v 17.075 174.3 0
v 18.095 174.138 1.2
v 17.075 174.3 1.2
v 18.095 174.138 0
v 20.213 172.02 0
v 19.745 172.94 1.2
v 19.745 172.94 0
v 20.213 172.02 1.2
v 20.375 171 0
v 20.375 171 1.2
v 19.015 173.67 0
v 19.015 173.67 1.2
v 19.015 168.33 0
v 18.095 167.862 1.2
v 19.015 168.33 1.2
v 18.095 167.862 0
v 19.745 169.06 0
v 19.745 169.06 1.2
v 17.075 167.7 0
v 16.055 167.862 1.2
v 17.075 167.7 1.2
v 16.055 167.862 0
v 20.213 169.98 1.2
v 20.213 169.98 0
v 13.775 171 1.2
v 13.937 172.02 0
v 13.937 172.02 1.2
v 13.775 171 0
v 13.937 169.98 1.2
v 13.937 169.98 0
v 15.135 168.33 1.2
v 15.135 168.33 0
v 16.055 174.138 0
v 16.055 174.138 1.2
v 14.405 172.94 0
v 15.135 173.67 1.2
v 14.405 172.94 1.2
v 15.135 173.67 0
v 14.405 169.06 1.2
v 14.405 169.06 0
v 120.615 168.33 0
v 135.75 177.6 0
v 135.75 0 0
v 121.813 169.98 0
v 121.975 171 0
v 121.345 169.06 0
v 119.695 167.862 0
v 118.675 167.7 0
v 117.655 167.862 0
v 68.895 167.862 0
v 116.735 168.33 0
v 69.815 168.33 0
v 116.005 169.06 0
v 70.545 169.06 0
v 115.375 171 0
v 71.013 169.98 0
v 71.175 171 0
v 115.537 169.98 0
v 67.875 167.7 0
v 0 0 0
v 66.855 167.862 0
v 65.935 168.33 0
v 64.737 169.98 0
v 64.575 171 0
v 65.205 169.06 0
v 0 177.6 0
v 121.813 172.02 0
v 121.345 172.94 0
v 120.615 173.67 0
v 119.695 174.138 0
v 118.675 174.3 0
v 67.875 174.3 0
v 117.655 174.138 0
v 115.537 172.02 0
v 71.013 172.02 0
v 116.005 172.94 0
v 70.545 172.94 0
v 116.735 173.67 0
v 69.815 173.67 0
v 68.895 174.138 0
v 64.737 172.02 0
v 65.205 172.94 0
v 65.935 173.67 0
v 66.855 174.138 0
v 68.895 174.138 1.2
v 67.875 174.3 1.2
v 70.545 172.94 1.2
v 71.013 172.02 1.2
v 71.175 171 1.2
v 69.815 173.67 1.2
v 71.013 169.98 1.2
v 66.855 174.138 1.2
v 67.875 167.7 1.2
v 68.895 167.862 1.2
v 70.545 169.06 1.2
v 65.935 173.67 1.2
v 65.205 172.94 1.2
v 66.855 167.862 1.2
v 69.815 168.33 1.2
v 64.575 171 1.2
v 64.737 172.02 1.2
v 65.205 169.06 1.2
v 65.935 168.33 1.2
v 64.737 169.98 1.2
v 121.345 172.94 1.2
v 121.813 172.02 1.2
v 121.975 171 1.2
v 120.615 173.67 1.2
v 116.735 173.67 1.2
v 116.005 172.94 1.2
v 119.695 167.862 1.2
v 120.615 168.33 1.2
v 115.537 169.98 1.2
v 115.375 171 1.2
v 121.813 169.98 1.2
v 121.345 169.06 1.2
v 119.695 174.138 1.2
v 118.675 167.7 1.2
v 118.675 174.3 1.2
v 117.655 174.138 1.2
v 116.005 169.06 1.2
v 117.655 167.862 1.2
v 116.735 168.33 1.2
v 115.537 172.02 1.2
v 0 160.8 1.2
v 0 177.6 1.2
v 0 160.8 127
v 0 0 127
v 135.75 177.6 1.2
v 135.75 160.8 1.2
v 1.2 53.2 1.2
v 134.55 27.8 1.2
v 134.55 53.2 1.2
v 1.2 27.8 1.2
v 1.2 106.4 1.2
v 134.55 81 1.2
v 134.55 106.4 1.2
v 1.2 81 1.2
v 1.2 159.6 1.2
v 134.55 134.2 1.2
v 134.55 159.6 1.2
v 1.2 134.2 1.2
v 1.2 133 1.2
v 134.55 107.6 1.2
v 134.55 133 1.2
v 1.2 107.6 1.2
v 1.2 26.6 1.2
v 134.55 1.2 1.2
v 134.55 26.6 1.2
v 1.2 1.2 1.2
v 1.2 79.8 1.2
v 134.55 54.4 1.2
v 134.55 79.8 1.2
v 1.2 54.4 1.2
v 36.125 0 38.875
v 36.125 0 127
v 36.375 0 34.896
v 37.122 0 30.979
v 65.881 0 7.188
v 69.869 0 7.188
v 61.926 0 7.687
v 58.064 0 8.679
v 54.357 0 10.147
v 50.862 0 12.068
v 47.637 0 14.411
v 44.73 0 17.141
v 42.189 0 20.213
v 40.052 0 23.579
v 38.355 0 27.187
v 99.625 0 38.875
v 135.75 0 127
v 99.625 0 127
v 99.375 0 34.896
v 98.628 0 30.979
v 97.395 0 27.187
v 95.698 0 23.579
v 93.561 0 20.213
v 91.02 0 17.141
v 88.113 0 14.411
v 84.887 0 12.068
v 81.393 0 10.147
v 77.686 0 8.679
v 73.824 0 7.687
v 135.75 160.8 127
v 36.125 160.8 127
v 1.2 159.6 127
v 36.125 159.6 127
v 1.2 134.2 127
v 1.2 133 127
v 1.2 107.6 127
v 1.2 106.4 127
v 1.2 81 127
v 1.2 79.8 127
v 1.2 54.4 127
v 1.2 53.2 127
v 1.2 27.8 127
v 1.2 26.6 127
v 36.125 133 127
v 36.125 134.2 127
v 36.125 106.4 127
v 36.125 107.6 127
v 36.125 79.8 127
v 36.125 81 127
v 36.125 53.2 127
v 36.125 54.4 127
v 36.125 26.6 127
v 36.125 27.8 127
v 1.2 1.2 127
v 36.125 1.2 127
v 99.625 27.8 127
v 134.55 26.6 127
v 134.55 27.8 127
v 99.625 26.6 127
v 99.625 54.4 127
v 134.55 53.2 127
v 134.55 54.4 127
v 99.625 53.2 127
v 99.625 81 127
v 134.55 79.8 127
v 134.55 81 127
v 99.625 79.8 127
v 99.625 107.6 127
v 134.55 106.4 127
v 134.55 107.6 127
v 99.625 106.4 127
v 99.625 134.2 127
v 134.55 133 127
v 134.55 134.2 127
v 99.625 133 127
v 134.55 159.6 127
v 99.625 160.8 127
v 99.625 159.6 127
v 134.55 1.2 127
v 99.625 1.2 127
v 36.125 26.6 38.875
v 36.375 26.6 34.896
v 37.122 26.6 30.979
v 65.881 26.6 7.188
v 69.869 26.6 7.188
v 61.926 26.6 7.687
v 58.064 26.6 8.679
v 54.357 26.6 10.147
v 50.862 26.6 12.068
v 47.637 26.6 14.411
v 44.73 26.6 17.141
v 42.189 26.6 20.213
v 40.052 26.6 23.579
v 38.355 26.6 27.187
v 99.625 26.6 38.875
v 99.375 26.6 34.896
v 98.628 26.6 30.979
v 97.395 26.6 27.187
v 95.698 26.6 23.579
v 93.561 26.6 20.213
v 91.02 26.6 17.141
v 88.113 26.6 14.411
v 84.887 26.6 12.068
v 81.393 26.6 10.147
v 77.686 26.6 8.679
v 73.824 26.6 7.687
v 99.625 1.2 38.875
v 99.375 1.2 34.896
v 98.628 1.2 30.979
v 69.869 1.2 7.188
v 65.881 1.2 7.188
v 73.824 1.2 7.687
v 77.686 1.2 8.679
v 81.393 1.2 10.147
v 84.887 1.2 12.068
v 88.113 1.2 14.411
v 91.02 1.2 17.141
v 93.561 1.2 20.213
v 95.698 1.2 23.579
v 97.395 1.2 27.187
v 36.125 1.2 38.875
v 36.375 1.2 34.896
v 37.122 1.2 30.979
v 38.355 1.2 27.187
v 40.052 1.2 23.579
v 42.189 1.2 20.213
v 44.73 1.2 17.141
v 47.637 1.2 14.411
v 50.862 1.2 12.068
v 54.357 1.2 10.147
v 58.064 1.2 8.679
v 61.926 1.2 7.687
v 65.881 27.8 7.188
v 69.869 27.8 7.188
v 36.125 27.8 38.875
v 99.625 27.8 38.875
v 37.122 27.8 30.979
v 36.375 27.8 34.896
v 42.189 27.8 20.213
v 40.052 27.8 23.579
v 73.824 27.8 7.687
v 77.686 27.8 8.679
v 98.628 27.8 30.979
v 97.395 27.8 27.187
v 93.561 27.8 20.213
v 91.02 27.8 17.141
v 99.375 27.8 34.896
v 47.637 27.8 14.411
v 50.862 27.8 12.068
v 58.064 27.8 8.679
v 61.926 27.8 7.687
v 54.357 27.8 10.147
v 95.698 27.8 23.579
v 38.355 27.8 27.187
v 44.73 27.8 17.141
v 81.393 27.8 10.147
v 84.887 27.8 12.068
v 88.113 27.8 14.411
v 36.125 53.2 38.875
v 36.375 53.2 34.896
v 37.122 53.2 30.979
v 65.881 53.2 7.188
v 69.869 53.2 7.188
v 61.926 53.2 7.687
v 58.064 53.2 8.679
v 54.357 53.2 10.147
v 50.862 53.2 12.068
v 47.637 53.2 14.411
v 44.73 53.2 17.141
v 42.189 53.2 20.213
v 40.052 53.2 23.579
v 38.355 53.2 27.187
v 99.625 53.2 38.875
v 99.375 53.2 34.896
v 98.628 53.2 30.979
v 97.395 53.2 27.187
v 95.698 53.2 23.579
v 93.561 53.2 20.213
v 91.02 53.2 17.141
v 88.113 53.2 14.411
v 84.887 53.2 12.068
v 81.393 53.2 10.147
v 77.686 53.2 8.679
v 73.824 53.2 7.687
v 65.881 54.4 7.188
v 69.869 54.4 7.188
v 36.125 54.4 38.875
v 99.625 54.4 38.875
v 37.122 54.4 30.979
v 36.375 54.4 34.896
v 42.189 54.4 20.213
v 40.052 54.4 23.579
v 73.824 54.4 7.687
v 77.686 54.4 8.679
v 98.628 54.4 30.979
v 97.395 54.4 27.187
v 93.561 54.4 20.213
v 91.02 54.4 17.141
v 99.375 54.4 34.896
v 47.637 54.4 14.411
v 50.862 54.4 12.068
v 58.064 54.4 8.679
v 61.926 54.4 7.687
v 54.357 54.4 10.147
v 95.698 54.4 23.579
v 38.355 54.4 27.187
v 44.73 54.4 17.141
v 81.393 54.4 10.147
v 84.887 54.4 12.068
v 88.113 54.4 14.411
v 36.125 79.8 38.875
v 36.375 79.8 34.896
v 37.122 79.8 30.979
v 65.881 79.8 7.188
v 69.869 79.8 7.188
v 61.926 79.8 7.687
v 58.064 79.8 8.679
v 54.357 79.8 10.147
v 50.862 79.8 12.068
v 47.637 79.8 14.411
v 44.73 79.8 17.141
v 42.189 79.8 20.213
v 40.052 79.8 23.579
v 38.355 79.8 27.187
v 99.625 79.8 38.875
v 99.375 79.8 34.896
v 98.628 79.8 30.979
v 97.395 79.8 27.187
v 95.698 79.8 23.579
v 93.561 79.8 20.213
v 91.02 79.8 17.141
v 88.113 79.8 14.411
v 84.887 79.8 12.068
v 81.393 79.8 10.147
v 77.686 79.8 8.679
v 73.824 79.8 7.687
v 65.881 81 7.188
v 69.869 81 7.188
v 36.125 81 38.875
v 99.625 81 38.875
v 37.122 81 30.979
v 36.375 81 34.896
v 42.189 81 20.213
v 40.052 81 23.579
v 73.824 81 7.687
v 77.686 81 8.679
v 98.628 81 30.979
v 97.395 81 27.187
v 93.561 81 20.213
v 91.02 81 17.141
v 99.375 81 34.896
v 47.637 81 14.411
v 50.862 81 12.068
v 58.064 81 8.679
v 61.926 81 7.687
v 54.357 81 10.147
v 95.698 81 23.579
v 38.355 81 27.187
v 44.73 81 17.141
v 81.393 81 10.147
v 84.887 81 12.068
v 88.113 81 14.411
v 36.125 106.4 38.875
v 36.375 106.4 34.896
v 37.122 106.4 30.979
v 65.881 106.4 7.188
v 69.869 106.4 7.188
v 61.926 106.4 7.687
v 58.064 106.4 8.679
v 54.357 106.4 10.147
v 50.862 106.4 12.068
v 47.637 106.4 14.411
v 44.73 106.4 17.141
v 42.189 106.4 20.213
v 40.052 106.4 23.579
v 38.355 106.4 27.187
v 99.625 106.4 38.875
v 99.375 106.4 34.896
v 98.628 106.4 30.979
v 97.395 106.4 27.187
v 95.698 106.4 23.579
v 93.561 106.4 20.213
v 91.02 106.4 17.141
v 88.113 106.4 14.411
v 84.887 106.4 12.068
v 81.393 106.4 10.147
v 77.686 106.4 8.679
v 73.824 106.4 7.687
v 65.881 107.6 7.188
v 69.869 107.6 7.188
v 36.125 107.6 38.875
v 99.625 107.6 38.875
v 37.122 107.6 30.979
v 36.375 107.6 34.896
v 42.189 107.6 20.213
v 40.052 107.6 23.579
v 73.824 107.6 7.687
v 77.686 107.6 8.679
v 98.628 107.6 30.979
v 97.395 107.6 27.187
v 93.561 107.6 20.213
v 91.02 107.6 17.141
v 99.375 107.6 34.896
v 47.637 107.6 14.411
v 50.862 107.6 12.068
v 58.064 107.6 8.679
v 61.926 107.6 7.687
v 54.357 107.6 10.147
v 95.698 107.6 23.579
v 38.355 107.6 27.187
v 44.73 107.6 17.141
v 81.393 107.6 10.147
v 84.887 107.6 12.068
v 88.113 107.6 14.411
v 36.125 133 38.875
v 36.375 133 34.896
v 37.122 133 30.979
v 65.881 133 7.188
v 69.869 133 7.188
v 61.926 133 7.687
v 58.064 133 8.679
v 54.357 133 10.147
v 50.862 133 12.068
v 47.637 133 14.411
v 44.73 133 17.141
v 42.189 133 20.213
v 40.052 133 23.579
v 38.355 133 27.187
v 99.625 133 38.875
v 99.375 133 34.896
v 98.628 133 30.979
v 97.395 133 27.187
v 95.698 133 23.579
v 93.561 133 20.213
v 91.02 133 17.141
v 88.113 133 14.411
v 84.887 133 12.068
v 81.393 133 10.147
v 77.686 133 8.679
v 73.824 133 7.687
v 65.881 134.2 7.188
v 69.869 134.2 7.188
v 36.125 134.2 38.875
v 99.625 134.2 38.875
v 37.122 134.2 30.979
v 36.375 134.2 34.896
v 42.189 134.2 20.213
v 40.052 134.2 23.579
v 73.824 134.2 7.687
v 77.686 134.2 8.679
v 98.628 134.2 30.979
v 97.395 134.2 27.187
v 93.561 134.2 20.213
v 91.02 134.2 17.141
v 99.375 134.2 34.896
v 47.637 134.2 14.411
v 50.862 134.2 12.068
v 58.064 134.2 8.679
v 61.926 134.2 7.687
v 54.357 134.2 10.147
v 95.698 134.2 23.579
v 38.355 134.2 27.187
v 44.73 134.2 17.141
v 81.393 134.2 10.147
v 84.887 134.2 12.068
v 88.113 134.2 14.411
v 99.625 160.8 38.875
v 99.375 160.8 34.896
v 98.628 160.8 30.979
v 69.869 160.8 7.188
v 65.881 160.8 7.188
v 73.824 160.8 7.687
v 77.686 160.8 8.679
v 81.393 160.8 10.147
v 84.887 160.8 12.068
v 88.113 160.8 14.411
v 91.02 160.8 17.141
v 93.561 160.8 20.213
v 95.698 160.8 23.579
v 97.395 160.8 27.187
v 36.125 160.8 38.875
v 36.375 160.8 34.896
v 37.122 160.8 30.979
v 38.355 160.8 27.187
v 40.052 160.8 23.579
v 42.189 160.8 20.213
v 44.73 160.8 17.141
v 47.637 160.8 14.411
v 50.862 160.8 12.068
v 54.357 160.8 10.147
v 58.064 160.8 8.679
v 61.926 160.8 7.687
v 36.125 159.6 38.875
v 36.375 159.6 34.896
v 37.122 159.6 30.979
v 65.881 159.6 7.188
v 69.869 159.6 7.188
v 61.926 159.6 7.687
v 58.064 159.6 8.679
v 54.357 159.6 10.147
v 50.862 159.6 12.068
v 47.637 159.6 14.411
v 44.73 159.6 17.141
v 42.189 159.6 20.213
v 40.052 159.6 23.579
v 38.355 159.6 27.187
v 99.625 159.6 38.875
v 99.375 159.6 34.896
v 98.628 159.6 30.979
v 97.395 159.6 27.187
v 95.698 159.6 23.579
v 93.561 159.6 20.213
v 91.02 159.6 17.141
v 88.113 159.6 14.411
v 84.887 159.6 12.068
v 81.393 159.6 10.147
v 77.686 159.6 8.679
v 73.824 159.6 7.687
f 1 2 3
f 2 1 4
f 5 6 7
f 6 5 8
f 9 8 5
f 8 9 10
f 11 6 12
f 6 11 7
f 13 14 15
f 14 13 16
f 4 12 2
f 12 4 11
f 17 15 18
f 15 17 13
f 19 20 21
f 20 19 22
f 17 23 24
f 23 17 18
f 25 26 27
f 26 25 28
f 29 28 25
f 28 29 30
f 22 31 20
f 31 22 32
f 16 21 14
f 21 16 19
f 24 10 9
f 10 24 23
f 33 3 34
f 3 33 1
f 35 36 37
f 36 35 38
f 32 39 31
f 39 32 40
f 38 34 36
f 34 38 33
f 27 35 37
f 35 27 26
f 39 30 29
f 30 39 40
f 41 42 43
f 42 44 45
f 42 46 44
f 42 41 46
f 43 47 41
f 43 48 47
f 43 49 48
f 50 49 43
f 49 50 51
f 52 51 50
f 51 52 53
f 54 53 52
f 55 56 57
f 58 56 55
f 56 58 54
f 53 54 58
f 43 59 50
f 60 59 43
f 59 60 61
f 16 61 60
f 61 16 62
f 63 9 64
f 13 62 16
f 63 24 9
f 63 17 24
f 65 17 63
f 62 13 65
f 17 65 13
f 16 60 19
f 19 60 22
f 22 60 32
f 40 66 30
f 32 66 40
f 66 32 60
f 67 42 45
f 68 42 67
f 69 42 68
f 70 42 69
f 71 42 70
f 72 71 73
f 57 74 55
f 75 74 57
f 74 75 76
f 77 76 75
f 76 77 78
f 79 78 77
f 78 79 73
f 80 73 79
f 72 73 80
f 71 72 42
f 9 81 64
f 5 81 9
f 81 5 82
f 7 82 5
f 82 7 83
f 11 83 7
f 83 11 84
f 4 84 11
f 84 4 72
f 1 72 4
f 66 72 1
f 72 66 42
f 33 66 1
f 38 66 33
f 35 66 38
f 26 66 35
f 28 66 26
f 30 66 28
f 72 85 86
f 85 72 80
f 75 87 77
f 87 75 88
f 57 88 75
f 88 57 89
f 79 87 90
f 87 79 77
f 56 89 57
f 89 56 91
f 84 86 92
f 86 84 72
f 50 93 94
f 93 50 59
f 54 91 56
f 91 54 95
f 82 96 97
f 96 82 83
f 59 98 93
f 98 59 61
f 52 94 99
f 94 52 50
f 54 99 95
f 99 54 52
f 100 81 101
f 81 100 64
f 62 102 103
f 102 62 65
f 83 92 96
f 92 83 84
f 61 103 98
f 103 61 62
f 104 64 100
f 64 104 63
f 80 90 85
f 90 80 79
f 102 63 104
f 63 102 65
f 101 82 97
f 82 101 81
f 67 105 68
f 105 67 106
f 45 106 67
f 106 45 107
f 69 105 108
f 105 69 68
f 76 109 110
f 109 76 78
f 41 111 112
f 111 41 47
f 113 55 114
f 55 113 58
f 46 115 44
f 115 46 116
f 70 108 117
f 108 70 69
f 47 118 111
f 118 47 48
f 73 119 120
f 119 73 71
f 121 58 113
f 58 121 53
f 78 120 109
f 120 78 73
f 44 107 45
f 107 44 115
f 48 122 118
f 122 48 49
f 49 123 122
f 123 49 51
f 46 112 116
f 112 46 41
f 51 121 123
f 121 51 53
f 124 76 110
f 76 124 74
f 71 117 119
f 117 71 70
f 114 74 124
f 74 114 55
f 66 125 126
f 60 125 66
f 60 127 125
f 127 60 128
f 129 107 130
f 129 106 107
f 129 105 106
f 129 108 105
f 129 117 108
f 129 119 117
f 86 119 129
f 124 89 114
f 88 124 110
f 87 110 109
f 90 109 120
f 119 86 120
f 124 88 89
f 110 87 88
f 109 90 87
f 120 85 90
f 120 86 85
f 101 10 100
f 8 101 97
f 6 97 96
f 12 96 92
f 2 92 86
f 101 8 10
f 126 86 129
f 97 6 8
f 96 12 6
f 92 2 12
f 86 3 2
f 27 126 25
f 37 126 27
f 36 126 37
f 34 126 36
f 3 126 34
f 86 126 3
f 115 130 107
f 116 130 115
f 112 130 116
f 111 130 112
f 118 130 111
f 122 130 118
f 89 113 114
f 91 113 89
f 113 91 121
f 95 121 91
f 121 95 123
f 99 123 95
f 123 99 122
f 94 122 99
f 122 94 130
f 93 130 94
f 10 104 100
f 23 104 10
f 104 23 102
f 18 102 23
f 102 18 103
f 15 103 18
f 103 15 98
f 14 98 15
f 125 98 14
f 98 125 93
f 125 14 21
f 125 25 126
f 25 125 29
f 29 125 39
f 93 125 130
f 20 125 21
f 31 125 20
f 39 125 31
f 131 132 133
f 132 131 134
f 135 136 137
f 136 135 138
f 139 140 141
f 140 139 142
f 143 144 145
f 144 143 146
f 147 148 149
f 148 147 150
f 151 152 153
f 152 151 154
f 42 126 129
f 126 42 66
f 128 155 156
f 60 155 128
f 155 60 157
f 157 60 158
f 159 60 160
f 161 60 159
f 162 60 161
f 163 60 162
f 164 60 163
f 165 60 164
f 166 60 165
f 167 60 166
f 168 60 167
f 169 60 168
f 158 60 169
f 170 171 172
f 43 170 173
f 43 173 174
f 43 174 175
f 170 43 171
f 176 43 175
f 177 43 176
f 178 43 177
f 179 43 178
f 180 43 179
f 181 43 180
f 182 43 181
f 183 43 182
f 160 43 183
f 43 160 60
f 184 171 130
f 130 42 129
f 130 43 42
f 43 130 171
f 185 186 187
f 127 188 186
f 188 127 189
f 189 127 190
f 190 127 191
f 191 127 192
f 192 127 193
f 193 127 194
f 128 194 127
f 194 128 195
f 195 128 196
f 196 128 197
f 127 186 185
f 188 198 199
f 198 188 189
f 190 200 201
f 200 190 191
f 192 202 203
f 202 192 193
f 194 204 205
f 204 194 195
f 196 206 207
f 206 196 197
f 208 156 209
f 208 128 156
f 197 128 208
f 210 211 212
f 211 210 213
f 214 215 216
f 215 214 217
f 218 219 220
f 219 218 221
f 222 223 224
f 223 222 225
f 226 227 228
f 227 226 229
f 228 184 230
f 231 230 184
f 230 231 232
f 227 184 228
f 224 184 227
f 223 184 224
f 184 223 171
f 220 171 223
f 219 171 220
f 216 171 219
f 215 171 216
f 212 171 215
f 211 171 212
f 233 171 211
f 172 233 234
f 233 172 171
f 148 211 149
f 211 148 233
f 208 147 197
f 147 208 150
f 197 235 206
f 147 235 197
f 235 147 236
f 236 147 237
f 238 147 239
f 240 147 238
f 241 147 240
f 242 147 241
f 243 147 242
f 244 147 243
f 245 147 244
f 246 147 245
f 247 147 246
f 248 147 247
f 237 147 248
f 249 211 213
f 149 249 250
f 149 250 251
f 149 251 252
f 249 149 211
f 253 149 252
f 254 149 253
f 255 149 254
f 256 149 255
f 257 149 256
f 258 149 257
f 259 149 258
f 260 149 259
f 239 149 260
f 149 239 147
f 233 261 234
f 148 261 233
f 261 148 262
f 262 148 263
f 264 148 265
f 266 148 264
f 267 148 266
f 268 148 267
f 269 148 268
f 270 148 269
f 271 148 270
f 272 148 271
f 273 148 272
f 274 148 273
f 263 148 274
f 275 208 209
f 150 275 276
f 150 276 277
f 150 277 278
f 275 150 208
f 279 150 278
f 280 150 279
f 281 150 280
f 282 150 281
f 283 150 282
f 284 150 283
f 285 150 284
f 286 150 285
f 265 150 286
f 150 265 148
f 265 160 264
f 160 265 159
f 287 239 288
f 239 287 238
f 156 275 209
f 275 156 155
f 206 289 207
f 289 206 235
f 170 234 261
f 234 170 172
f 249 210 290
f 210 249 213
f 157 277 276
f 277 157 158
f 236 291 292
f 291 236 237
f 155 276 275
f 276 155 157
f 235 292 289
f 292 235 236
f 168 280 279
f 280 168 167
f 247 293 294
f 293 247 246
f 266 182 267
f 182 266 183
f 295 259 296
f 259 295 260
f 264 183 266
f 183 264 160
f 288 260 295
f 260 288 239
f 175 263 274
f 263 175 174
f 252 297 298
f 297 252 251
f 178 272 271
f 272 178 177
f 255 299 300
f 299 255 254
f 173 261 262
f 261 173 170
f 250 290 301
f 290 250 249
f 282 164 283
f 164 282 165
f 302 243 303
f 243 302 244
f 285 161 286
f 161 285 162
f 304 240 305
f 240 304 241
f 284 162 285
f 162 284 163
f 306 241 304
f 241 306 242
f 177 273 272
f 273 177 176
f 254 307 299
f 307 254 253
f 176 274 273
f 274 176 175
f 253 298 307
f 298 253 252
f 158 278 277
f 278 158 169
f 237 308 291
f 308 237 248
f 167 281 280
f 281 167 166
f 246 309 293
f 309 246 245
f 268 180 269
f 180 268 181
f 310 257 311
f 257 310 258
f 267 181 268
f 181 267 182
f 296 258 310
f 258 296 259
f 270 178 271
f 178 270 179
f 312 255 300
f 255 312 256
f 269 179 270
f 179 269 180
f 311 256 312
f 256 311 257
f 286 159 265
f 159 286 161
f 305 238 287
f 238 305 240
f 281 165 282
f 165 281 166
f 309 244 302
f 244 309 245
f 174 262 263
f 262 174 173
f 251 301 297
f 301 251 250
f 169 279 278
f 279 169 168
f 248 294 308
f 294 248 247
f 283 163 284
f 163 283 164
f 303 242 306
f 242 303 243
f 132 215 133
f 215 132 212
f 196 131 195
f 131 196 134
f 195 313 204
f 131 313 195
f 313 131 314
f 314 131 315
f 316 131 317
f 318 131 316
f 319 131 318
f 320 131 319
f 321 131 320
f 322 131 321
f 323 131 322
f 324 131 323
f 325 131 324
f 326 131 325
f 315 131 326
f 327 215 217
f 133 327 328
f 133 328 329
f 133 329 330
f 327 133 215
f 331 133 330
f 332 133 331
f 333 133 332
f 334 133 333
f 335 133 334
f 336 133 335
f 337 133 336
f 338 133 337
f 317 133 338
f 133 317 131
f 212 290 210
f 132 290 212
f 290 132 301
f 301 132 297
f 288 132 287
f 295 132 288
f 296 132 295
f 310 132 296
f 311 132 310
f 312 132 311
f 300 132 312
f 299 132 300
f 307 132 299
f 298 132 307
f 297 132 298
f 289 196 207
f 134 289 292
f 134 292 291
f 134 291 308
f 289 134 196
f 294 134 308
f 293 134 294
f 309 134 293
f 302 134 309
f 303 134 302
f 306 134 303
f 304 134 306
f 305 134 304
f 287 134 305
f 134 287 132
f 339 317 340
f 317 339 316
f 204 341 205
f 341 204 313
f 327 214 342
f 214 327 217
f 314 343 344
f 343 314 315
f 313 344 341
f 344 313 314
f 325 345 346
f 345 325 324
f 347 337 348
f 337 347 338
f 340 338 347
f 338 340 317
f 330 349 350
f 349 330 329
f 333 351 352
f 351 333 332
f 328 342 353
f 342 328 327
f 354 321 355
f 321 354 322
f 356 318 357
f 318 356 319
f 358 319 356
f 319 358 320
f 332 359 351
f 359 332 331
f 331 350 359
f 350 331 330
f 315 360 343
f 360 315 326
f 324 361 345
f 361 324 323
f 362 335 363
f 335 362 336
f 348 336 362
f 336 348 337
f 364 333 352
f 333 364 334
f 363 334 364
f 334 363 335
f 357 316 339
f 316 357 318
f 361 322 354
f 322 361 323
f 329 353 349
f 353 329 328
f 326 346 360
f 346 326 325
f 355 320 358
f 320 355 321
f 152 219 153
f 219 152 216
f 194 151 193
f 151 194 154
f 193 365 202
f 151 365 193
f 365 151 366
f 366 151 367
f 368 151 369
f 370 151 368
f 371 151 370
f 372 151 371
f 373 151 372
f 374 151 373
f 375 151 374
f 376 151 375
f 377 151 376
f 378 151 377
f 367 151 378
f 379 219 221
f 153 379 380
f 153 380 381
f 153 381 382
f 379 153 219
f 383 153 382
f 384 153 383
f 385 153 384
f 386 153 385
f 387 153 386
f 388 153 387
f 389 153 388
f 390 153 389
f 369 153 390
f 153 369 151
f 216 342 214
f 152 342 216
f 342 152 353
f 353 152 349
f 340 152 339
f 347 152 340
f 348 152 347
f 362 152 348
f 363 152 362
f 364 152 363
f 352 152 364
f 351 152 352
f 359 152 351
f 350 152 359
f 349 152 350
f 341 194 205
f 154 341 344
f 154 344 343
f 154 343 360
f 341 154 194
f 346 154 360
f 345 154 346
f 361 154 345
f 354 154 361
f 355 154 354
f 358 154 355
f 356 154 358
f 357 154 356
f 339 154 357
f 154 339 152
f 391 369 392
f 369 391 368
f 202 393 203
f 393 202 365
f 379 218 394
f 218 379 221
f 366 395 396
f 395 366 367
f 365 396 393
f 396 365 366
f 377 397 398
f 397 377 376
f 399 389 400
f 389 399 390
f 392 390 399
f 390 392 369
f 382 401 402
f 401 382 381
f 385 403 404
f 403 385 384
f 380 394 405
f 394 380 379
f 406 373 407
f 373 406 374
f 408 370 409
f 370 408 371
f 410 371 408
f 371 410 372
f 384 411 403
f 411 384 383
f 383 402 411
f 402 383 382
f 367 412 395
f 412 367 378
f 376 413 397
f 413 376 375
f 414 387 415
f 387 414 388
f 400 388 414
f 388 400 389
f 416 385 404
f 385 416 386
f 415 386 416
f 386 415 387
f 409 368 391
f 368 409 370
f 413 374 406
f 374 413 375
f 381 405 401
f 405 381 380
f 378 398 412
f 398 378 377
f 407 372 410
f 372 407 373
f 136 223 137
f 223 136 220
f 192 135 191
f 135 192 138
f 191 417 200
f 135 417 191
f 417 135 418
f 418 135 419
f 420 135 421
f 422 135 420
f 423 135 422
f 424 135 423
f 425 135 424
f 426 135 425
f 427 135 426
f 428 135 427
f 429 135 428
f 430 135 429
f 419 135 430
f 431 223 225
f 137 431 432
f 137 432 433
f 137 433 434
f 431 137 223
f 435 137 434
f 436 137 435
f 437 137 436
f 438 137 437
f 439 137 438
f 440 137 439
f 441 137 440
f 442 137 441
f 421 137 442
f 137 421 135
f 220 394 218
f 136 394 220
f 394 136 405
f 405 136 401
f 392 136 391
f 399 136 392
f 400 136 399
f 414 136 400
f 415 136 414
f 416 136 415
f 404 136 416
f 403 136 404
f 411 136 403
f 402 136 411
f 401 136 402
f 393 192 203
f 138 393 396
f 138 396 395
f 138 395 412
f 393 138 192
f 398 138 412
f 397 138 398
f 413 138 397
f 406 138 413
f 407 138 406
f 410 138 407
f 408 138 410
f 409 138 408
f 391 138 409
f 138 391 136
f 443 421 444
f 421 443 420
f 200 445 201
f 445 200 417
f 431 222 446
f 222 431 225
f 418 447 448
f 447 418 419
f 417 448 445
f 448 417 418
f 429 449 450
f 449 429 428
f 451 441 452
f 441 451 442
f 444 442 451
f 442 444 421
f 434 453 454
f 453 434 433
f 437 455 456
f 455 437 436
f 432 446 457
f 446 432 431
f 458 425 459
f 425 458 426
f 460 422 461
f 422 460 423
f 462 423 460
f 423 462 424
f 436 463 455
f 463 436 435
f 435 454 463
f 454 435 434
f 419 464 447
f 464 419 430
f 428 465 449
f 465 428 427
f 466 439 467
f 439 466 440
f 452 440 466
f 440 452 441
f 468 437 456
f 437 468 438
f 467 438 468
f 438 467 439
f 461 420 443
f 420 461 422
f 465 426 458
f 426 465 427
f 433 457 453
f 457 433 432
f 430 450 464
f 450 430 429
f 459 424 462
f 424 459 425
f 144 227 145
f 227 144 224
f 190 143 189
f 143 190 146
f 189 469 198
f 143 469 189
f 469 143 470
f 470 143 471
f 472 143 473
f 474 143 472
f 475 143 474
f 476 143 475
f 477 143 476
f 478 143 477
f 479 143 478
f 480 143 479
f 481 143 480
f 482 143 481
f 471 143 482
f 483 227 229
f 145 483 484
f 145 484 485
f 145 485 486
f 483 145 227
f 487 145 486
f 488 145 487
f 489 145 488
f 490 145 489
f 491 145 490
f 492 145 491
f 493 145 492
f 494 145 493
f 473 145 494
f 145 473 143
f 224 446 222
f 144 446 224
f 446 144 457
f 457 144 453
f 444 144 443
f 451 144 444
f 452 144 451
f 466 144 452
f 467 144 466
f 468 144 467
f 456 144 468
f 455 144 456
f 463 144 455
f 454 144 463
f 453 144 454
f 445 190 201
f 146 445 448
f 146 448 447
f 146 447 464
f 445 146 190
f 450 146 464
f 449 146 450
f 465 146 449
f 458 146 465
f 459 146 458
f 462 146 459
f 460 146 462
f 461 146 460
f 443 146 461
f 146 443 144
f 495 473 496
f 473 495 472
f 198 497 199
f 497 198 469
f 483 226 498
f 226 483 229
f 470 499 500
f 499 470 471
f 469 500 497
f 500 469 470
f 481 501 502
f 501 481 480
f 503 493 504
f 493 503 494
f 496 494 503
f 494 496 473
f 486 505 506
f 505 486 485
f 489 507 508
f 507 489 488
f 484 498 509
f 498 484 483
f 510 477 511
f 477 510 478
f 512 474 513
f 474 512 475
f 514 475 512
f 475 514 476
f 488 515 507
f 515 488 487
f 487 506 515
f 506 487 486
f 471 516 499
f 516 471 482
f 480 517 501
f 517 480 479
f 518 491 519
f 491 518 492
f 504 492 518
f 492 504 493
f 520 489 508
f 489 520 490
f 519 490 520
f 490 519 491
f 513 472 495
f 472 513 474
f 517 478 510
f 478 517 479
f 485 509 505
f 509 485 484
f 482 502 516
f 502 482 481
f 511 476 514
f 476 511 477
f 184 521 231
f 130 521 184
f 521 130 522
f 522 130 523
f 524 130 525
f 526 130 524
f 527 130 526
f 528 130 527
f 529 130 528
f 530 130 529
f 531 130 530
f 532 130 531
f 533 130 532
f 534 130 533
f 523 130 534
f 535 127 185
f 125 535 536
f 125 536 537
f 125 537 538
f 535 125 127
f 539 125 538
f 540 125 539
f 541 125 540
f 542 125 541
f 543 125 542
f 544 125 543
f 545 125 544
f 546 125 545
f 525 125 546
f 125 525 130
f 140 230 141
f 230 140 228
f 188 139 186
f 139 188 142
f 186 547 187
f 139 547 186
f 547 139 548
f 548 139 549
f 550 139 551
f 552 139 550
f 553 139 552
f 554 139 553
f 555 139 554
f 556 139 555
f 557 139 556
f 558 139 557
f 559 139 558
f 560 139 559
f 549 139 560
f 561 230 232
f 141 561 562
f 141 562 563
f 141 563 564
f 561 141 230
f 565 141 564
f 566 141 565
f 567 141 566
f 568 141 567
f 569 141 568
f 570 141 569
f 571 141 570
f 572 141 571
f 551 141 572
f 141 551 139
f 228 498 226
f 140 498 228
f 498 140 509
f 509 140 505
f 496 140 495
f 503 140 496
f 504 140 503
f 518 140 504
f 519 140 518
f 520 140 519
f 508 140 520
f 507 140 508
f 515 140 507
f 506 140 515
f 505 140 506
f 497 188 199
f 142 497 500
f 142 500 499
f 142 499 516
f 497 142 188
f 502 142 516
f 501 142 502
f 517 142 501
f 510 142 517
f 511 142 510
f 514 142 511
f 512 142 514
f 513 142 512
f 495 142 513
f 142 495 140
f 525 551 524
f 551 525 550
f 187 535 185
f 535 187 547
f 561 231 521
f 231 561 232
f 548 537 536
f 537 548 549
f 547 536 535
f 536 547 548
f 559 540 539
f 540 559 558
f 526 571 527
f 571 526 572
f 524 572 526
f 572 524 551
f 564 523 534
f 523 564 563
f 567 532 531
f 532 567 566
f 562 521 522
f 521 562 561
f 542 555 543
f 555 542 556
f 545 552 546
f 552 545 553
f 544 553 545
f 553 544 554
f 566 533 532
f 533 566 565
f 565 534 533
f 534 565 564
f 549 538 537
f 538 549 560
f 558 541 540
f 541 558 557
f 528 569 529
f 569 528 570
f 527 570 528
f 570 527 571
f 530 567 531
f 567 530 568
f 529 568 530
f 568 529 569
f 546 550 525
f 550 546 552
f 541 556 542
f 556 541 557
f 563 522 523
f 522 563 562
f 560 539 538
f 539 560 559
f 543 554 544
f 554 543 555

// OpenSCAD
//--------------------------------------------
// Sanding Disk Pegboard Organizer
// forked from https://www.thingiverse.com/thing:607640/ by DarkroomDave
// Updated by Nicodemus Paradiso (nicodemus26)
//
// Pick Sizes for each compartment bottom to top
// Rough
//compartments = ["320", "220", "180", "120", "80", "40"];
// Fine
compartments = ["2000", "1500", "1200", "1000", "800", "600"];
// Number of compartments
compartment_count=len(compartments); 
// Disk size in inches (tested 5)
disk_diam=5; // In Inches
// Usable height in each compartment in inches
cavity_height=1;

//--------------------------------------------

mm_per_in=25.4;

// Wall thickness for all walls, backplate, hang tab
wall=1.2;

// total height of each compartment.
compartment_height=cavity_height*mm_per_in+(wall*2);

// How wide the object is. 1/4in of tolerance to make insertion and removal easier.
backplate_width=((disk_diam+.25)*mm_per_in)+(wall*2);

// Hang tab options, peg holes are auto-centered
hang_tab_height=18;
peg_hole_radius=3.3;
peg_hole_distance=2*mm_per_in;

// Radius of the hollow center, bigger saves plastic but less strong.
pullout_radius=1.25*mm_per_in;

// How far to extrude floating text, recommend two print layers.
lable_extrude=.4;

module make_peg_holes(cp_h) {
    holeable_space=backplate_width-(wall*2)-(peg_hole_radius*2);
    holes=round(holeable_space/peg_hole_distance-.5);
    side_gap=(holeable_space-(holes*peg_hole_distance))/2+wall+peg_hole_radius;
    echo(holeable_space);
    echo(holes);
    echo(side_gap);
    
    for ( i = [0 : holes] ) {
        translate([side_gap+i*peg_hole_distance,(cp_h+hang_tab_height)-(peg_hole_radius*2),0])
		cylinder(h = wall+.2, r=peg_hole_radius,$fn=20);
    }
}

module make_back_wall(cp_h) {
	cube([backplate_width,cp_h+hang_tab_height,wall]);
}

module make_compartment(cpn) {
	translate([0,cpn*(compartment_height-wall),0]) {
        difference() {
            cube([backplate_width,compartment_height,disk_diam*mm_per_in]);
            translate([wall,wall,wall]) {
                cube([backplate_width-(wall*2),compartment_height-(wall*2),(disk_diam*mm_per_in)]);
            }
        
    
            translate([(backplate_width)/2,0,disk_diam*mm_per_in]) {
                rotate([270,0,0]) {
                    hull() {
                        cylinder(h = compartment_height+.1, r=pullout_radius,$fn=50);
                        translate([0,backplate_width-pullout_radius*1.5,0])
                        cylinder(h = compartment_height+.1, r=pullout_radius,$fn=50);
                    }
                }
            }
        }
	}
}

module do_label(compartment_index,shift,side) {
    align = (side > 0) ? "right" : "left";
    ts=compartment_height/2;
    //translate([shift,0,disk_diam*mm_per_in-wall])
    //rotate([0,-90*side,0])
    //translate([0,compartment_index*(compartment_height-wall),0])    
    //linear_extrude(height = lable_extrude, center = false, convexity = 0, twist = 0) 
    //translate([0, compartment_height/4]) 
    //text(compartments[compartment_index], font = "Liberation Sans",halign=align,size = ts);
}

// ---------------
// Modules used below
// ---------------

// Backplate and hang tab
difference() {
    hull() {
        make_back_wall(compartment_count*(compartment_height-wall));   
    }
        make_peg_holes(compartment_count*(compartment_height-wall));
}

// Compartments
union() {
    
    for ( i = [0 : compartment_count-1] ) {
        make_compartment(i);
    }
}

// Labels
union() {
    for ( i = [0 : compartment_count-1] ) {
        // Left label
        do_label(i,0,1);
        translate([lable_extrude/2, 0, -lable_extrude/2])
        do_label(i,0,1);
        
        // Right label
        do_label(i,backplate_width,-1);
        translate([-lable_extrude/2, 0, -lable_extrude/2])
        do_label(i,backplate_width,-1);
    }    
}
